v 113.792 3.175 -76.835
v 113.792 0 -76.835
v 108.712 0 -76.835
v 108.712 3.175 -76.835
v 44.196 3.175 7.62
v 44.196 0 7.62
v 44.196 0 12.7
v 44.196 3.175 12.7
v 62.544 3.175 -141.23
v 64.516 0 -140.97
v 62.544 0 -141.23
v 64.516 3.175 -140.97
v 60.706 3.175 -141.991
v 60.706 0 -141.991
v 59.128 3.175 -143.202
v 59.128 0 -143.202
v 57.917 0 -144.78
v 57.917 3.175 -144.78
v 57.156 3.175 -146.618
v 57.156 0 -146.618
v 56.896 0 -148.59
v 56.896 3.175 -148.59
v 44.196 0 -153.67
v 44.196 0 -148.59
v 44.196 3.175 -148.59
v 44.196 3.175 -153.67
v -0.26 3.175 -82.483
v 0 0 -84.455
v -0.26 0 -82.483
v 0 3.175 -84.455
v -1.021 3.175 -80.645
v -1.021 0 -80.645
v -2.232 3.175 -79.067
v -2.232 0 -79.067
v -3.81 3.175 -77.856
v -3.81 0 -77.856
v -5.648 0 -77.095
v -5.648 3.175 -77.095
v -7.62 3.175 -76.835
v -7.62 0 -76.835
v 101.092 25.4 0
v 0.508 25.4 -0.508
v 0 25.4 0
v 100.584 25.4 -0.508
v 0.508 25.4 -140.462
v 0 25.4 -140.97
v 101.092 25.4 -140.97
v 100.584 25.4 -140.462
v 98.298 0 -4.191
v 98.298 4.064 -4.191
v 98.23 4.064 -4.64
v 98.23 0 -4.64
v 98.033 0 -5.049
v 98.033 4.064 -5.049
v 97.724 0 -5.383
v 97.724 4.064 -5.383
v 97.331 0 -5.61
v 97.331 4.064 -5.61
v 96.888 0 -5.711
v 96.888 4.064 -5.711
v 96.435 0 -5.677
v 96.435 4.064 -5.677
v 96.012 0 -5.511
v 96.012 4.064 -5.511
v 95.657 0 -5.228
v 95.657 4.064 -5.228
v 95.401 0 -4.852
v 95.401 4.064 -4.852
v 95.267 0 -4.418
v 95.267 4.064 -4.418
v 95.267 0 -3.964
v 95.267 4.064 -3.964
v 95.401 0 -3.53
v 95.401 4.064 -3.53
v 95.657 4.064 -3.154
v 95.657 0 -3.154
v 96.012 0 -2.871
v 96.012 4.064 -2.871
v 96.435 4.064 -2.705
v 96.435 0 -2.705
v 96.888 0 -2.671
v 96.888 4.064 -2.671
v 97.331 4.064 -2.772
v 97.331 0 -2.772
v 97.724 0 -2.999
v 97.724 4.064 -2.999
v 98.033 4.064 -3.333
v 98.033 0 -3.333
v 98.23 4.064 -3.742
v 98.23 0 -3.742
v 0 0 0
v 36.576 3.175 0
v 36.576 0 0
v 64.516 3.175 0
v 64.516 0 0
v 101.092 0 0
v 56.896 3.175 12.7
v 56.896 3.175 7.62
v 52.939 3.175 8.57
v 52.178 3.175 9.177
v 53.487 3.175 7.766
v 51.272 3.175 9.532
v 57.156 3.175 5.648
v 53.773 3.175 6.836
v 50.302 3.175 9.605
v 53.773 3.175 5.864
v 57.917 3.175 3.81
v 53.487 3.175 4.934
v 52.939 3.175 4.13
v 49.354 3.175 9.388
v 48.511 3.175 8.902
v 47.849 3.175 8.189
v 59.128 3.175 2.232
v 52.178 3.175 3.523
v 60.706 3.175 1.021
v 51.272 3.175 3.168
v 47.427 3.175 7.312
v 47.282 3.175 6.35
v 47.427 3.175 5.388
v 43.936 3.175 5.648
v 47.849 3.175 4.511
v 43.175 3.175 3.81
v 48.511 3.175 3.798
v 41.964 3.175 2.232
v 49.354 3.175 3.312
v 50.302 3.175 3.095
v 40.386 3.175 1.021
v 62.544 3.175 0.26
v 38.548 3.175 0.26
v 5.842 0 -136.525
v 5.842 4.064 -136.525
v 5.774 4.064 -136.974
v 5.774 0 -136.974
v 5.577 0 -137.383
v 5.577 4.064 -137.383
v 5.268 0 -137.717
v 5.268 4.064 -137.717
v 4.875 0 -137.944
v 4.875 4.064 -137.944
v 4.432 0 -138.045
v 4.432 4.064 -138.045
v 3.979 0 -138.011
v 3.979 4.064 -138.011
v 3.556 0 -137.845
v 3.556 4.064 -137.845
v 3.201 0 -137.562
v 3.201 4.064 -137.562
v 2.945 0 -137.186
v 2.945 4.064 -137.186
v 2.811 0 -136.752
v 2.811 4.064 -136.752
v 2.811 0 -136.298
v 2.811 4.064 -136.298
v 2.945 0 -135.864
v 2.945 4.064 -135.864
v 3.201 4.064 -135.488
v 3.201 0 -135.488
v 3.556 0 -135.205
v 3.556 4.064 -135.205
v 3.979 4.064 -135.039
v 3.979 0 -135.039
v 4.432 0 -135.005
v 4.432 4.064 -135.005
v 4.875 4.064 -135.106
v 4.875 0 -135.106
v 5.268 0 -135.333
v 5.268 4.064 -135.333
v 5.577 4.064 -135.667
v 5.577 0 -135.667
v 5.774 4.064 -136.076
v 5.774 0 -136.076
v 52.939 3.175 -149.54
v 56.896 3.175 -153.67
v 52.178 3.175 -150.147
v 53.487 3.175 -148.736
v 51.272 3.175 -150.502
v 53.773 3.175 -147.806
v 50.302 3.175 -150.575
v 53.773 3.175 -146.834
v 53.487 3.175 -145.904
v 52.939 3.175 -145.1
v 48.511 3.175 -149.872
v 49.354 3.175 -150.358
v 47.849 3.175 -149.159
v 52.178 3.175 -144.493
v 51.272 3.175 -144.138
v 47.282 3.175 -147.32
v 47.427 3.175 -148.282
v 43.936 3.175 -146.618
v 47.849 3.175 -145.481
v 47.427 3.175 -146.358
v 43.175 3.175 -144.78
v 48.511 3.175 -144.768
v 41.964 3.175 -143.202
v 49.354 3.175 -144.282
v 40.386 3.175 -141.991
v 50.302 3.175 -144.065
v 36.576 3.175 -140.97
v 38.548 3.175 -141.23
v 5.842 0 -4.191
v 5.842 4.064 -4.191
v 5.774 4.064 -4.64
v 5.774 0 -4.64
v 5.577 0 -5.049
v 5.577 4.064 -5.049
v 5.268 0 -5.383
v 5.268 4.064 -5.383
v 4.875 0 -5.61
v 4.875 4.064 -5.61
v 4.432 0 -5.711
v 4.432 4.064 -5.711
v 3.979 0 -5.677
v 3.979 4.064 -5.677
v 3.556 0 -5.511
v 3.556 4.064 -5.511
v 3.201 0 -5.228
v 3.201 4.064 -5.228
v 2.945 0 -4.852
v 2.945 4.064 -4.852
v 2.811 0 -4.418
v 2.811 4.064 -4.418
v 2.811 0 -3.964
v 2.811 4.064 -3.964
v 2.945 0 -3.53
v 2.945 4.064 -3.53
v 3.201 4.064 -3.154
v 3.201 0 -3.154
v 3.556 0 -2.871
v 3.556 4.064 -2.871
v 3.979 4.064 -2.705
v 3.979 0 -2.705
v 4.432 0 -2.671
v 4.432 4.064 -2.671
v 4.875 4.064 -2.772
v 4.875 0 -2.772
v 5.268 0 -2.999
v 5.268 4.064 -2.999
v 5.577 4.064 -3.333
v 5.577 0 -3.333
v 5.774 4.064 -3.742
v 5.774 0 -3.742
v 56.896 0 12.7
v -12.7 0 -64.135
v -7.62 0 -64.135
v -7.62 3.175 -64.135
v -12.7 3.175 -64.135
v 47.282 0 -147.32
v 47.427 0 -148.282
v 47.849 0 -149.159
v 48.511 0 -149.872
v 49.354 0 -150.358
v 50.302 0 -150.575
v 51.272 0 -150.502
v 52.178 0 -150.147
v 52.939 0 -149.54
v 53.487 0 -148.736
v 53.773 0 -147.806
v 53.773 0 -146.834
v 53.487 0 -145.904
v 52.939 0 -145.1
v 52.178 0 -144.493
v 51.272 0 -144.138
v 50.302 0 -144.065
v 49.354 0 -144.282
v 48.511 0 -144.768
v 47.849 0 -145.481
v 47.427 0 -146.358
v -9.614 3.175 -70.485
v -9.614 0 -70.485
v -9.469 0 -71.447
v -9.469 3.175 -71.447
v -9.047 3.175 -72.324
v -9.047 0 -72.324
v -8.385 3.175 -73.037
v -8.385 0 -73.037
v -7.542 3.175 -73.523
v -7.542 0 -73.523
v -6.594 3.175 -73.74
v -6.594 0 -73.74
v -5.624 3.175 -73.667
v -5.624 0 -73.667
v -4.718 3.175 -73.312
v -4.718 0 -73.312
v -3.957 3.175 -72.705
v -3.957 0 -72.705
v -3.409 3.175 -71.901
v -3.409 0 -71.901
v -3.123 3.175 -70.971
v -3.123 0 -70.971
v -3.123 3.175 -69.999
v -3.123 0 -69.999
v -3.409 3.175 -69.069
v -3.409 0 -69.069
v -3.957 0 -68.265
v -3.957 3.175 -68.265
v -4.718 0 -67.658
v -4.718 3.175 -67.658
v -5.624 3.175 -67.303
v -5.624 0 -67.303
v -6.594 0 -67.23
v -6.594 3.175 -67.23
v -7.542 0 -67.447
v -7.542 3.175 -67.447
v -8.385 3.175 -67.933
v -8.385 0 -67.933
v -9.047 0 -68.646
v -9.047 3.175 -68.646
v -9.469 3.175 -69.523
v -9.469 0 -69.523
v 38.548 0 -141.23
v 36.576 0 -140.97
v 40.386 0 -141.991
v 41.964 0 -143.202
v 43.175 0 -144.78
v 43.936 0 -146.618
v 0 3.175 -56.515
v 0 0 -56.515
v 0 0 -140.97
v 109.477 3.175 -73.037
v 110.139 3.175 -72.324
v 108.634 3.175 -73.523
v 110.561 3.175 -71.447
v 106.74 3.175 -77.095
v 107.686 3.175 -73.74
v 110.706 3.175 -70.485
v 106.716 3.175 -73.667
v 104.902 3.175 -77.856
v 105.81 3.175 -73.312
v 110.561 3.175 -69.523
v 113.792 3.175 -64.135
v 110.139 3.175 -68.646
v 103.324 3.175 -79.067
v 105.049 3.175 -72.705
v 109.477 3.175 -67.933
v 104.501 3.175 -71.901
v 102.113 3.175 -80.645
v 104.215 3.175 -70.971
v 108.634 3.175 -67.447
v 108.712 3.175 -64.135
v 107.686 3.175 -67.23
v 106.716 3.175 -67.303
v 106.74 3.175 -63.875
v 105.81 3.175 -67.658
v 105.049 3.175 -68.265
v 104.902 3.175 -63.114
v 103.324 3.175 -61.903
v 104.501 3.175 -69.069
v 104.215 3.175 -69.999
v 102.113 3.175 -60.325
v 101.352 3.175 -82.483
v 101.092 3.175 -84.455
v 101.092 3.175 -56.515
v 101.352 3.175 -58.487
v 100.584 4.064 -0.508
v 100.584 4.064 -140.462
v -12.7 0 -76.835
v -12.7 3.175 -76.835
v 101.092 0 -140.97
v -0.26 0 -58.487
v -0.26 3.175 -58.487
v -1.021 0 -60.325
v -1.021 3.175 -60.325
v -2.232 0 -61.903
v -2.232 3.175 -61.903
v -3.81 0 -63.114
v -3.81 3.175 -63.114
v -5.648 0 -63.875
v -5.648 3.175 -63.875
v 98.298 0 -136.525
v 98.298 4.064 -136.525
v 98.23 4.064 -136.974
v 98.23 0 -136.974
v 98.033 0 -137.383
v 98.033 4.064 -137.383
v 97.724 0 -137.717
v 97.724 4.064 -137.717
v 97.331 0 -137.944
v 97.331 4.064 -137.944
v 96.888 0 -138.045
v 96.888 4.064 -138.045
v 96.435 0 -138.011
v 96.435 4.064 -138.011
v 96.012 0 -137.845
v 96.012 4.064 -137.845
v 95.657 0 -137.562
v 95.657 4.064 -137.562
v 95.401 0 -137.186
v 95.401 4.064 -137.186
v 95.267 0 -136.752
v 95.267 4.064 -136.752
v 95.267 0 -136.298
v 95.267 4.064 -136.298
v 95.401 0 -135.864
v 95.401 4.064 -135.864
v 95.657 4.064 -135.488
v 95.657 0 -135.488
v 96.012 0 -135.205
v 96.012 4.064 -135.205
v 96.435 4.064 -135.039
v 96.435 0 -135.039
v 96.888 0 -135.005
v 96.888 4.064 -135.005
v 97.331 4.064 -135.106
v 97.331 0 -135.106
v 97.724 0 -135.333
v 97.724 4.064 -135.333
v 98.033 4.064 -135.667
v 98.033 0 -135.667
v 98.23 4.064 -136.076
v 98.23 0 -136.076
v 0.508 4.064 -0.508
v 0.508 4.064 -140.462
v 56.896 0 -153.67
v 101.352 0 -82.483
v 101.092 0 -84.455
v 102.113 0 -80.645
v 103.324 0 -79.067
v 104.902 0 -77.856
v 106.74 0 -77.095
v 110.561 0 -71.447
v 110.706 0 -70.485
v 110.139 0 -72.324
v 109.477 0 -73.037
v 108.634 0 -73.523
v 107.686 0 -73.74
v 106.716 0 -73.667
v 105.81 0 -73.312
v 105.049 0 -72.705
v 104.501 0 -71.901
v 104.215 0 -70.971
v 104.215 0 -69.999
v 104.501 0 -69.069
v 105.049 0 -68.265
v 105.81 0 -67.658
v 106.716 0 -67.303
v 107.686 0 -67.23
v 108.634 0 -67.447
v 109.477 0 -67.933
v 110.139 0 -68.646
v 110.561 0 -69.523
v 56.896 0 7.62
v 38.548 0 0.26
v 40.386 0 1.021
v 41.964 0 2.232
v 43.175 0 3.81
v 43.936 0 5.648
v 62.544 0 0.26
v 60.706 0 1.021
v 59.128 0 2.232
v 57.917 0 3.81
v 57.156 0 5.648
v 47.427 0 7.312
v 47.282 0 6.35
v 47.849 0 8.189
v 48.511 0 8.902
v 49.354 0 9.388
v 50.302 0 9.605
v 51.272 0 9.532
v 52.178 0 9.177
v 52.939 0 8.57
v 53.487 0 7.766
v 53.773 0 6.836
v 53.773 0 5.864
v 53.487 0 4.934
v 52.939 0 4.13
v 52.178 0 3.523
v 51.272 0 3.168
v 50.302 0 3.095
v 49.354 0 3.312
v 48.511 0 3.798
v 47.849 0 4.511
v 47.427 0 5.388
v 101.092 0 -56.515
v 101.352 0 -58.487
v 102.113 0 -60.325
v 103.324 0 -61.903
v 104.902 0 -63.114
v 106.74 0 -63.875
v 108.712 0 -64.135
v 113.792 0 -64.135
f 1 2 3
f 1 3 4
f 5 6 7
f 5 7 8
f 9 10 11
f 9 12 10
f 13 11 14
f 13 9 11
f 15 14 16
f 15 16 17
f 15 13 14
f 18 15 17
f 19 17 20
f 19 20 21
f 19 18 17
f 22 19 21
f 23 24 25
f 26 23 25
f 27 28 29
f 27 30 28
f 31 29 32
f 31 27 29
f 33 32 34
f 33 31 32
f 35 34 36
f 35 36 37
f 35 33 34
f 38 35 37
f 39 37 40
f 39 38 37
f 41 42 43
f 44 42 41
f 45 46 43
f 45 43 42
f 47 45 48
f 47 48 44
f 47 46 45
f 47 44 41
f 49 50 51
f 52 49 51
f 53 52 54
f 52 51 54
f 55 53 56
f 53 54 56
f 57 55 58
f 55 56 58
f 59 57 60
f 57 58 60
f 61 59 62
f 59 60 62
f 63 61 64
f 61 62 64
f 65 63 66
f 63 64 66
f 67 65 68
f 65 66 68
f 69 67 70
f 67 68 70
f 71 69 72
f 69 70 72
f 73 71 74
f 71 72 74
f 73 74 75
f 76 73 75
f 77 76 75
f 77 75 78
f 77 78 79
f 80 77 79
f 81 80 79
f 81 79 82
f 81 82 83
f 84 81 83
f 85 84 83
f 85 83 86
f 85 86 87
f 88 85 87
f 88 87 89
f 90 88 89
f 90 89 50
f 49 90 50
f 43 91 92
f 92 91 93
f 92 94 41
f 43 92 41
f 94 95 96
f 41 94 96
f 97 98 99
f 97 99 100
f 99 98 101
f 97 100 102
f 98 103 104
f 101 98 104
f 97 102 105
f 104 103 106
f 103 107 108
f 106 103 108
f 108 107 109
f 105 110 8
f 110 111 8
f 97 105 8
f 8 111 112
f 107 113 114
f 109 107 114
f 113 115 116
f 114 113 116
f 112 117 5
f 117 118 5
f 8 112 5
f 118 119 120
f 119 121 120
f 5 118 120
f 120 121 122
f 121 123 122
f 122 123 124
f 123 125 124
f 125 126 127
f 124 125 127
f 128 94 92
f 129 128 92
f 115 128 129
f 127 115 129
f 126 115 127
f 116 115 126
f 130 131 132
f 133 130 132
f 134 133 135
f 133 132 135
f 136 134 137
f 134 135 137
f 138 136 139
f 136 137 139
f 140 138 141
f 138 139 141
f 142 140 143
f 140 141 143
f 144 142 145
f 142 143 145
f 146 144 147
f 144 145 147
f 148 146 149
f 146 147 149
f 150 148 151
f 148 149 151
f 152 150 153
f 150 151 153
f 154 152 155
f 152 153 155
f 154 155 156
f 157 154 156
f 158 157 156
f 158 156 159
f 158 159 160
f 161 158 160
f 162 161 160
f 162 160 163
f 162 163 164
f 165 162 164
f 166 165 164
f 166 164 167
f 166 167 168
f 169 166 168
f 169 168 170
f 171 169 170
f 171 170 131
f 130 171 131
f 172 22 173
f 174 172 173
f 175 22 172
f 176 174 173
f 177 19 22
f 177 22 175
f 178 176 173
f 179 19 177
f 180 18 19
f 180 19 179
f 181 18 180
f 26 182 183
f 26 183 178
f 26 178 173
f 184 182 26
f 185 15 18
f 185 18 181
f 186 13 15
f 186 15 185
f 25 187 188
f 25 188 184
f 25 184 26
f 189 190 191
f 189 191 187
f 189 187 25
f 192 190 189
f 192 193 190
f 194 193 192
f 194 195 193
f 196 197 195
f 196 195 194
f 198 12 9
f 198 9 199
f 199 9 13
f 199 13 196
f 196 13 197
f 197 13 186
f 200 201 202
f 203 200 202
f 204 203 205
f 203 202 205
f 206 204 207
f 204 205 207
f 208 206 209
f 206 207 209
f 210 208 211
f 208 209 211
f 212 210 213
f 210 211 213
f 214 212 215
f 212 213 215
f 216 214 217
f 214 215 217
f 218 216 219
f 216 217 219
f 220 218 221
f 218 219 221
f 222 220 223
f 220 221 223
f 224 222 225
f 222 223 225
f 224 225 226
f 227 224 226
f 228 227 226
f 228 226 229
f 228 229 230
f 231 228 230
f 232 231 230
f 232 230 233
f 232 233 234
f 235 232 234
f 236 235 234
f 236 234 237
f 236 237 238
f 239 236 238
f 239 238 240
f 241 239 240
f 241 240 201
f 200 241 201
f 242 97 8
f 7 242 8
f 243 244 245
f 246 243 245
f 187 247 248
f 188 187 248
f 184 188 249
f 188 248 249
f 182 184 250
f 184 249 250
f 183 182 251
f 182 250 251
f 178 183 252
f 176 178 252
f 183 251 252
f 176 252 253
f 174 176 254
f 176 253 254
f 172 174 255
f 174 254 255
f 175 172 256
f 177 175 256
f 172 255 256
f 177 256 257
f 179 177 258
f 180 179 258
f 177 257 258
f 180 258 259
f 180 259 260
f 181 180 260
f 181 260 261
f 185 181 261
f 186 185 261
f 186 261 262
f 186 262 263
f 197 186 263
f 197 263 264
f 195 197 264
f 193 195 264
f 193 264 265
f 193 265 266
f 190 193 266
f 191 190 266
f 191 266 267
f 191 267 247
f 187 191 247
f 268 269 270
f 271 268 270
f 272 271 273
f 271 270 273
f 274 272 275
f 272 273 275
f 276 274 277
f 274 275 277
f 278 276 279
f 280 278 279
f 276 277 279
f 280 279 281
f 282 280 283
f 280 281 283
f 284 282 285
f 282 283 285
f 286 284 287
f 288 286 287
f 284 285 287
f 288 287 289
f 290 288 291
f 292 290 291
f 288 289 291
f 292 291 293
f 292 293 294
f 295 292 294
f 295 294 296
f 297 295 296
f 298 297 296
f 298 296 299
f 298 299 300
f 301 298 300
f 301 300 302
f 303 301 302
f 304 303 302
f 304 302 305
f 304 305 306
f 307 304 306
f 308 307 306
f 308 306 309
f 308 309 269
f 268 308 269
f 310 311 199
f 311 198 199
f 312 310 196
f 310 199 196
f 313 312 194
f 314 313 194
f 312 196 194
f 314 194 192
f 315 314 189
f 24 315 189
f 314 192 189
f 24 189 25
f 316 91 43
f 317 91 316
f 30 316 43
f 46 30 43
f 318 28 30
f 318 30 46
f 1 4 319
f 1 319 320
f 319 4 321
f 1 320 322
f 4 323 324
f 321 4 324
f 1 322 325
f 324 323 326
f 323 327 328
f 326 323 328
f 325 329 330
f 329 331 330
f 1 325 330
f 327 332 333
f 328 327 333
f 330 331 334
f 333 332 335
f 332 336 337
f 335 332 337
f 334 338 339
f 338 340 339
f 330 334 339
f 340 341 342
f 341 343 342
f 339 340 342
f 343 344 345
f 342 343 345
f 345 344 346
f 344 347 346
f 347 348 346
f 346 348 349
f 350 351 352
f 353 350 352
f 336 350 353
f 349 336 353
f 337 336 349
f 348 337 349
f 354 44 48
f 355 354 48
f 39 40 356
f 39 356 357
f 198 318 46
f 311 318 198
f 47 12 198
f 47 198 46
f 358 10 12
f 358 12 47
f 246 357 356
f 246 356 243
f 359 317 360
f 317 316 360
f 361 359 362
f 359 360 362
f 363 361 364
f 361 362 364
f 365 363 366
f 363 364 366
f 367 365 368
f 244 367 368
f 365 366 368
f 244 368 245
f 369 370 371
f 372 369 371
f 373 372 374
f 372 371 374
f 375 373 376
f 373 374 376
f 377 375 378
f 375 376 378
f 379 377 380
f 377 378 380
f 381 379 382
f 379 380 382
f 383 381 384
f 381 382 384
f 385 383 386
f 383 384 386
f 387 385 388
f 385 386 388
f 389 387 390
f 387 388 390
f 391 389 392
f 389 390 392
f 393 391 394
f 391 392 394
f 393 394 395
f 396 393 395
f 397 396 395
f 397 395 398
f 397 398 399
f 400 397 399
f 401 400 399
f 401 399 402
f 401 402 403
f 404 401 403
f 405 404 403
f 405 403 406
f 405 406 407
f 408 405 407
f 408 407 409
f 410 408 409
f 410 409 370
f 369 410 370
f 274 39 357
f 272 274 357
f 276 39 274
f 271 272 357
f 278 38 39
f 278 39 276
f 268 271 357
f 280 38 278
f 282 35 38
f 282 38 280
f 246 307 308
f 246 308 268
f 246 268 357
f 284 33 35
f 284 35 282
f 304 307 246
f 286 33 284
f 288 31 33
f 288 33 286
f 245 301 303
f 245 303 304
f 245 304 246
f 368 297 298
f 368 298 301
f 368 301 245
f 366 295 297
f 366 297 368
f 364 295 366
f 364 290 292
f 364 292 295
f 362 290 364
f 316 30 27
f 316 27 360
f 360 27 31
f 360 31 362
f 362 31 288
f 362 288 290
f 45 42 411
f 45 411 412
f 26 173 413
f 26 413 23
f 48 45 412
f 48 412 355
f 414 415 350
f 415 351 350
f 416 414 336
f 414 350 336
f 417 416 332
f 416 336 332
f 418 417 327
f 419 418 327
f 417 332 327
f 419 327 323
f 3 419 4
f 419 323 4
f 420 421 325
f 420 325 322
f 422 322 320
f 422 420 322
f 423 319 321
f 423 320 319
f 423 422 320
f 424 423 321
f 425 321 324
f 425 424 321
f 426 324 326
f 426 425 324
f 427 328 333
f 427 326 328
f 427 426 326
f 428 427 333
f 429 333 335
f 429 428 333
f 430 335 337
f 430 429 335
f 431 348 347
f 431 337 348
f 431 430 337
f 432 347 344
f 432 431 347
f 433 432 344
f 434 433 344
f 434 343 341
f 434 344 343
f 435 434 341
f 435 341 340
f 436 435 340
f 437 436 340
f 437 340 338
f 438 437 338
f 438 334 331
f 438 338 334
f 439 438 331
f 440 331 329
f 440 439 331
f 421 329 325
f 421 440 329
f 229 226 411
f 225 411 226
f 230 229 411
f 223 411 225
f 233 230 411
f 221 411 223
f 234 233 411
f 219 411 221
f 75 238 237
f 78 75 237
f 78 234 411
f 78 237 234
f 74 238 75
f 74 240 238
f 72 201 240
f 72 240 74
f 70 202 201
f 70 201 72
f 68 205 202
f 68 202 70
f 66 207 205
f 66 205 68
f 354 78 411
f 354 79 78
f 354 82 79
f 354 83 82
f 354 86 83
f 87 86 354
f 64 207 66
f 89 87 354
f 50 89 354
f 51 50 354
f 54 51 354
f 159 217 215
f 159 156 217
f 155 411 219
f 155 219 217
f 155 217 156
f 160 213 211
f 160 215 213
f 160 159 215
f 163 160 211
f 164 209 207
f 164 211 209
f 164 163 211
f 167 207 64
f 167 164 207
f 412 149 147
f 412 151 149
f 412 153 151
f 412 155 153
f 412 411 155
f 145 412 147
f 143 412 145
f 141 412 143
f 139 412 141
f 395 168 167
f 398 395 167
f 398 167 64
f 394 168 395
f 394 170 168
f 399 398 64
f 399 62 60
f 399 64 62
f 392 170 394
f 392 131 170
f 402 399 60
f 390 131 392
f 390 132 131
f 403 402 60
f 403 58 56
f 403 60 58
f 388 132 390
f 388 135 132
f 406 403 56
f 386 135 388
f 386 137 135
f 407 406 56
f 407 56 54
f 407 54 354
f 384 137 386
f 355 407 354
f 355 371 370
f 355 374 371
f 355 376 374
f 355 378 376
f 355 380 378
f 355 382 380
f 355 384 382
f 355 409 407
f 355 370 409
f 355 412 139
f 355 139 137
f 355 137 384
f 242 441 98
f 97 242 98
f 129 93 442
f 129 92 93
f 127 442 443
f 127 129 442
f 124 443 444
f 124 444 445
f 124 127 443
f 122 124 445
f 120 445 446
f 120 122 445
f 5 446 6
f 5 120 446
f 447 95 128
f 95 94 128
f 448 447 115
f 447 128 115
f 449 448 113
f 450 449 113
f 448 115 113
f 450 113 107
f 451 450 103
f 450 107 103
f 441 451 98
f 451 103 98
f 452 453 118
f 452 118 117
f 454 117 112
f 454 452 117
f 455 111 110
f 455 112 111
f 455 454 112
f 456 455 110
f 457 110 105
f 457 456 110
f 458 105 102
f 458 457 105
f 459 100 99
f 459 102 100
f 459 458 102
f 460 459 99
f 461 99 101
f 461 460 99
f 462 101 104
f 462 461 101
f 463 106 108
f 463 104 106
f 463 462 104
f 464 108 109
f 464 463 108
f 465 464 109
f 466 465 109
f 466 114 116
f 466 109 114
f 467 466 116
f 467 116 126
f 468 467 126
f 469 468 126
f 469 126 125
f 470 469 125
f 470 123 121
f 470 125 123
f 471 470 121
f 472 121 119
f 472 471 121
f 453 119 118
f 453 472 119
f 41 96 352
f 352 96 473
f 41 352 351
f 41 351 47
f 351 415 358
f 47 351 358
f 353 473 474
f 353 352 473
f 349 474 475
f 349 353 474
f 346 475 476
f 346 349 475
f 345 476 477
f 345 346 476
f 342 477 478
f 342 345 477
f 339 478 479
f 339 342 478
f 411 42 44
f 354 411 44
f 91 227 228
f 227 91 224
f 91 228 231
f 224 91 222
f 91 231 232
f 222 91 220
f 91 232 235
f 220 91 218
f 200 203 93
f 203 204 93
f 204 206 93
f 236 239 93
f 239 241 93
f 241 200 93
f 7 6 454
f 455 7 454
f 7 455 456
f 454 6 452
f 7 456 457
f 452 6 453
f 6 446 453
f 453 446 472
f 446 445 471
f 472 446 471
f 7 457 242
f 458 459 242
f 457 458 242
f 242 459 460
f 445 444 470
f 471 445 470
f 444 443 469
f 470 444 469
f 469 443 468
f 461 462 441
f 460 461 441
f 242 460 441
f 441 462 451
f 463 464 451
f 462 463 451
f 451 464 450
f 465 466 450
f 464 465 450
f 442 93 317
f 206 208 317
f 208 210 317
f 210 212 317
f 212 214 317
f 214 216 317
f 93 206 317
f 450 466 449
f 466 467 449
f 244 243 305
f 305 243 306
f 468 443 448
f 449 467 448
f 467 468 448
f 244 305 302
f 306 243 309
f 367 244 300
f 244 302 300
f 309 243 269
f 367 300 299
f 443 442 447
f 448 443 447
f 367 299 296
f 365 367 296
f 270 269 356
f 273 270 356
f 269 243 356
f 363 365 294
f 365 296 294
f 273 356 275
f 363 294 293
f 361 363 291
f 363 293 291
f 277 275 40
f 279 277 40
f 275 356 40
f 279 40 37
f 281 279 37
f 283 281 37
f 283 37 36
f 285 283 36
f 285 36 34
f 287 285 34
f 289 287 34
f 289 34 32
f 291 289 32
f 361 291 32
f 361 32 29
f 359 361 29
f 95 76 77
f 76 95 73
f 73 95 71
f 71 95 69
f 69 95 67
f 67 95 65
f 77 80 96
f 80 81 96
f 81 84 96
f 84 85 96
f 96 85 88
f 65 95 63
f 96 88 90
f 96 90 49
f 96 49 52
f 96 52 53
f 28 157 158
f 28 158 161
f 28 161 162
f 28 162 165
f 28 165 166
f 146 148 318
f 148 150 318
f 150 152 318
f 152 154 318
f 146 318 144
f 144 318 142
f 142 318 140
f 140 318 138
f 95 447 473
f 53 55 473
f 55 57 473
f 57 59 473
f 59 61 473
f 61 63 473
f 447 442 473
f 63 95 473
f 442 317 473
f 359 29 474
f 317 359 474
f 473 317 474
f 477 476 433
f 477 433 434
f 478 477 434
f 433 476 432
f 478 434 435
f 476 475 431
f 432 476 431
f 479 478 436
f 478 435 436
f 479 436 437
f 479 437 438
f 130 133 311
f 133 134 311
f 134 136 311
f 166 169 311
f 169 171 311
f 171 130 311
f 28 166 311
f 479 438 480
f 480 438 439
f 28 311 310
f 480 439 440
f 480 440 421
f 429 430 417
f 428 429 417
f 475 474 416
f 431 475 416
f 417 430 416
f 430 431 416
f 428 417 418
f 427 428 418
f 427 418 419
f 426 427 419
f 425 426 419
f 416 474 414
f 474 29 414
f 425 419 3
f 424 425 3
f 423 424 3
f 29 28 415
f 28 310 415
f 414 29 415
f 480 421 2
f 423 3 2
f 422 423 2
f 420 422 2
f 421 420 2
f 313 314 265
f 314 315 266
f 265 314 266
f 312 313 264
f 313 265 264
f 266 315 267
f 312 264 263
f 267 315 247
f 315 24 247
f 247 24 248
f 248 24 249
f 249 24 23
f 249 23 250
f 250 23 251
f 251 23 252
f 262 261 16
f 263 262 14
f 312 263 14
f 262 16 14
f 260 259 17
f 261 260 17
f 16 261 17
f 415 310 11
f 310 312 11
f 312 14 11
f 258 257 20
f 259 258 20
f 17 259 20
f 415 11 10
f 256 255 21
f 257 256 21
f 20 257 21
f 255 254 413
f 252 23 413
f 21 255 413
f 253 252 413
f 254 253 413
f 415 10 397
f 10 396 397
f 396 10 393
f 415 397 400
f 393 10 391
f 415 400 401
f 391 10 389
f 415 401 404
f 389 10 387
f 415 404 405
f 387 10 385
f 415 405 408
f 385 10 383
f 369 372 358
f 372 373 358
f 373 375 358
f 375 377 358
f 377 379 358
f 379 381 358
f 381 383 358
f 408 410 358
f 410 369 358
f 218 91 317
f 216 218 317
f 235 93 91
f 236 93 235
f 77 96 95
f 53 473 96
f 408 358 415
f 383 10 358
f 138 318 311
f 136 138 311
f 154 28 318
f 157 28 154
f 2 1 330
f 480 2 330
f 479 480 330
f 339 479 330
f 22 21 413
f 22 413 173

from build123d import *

# Parameters (mm, degrees)
SKETCH1_W                = 101.092
SKETCH1_H                = 140.97
BOSS_EXTRUDE1_DEPTH      = 25.4
SKETCH2_W                = 100.076
SKETCH2_H                = 139.954
CUT_EXTRUDE1_DEPTH       = 21.336
SKETCH3_R                = 1.524
CUT_EXTRUDE2_DEPTH       = 21.336
SKETCH4_W                = 12.7
SKETCH4_H                = 3.175
BOSS_EXTRUDE2_DEPTH      = 12.7
F_5_16_18_TAPPED_HOLE1_D = 6.5278
SKETCH13_W               = 12.7
SKETCH13_H               = 3.175
BOSS_EXTRUDE3_DEPTH      = 12.7
F_5_16_18_TAPPED_HOLE2_D = 6.5278
FILLET1_R                = 7.62


with BuildPart() as part:
    # Sketch1 → Boss-Extrude1 (new body)
    with BuildSketch(Plane(origin=(0, 0, 0), x_dir=(1, 0, 0), z_dir=(0, 1, 0))):
        with Locations((50.546, 70.485)):
            Rectangle(SKETCH1_W, SKETCH1_H)
    extrude(amount=BOSS_EXTRUDE1_DEPTH)

    # Sketch2 → Cut-Extrude1 (cut)
    with BuildSketch(Plane(origin=(0, 25.4, 0), x_dir=(1, 0, 0), z_dir=(0, 1, 0))):
        with Locations((50.546, 70.485)):
            Rectangle(SKETCH2_W, SKETCH2_H)
    extrude(amount=-CUT_EXTRUDE1_DEPTH, mode=Mode.SUBTRACT)

    # Sketch3 → Cut-Extrude2 (cut)
    with BuildSketch(Plane(origin=(0, 4.064, 0), x_dir=(1, 0, 0), z_dir=(0, 1, 0))):
        with Locations((4.318, 136.525)):
            Circle(SKETCH3_R)
        with Locations((96.774, 136.525)):
            Circle(SKETCH3_R)
        with Locations((96.774, 4.191)):
            Circle(SKETCH3_R)
        with Locations((4.318, 4.191)):
            Circle(SKETCH3_R)
    extrude(amount=-CUT_EXTRUDE2_DEPTH, mode=Mode.SUBTRACT)

    # Sketch4 → Boss-Extrude2 (add)
    with BuildSketch(Plane(origin=(0, 0, -140.97), x_dir=(-1, 0, 0), z_dir=(0, 0, -1))):
        with Locations((-50.546, 1.5875)):
            Rectangle(SKETCH4_W, SKETCH4_H)
    boss_extrude2 = extrude(amount=BOSS_EXTRUDE2_DEPTH)

    # 5/16-18 Tapped Hole1 (through all)
    with Locations(Plane(origin=(0, 3.175, 0), x_dir=(1, 0, 0), z_dir=(0, 1, 0))):
        with Locations((50.546, 147.32)):
            f_5_16_18_tapped_hole1 = Hole(F_5_16_18_TAPPED_HOLE1_D / 2)

    # Mirror1: Boss-Extrude2, 5/16-18 Tapped Hole1 across plane
    add(boss_extrude2.mirror(Plane.XY.offset(-70.485)))
    add(f_5_16_18_tapped_hole1.mirror(Plane.XY.offset(-70.485)), mode=Mode.SUBTRACT)

    # Sketch13 → Boss-Extrude3 (add)
    with BuildSketch(Plane.ZY):
        with Locations((-70.485, 1.5875)):
            Rectangle(SKETCH13_W, SKETCH13_H)
    boss_extrude3 = extrude(amount=BOSS_EXTRUDE3_DEPTH)

    # 5/16-18 Tapped Hole2 (through all)
    with Locations(Plane(origin=(0, 3.175, 0), x_dir=(1, 0, 0), z_dir=(0, 1, 0))):
        with Locations((-6.35, 70.485)):
            f_5_16_18_tapped_hole2 = Hole(F_5_16_18_TAPPED_HOLE2_D / 2)

    # Mirror2: Boss-Extrude3, 5/16-18 Tapped Hole2 across plane
    add(boss_extrude3.mirror(Plane.ZY.offset(-50.546)))
    add(f_5_16_18_tapped_hole2.mirror(Plane.ZY.offset(-50.546)), mode=Mode.SUBTRACT)

    # Fillet1
    fillet1_edges = [part.edges().sort_by_distance(p)[0] for p in [
        (101.092, 1.5875, -64.135),
        (101.092, 1.5875, -76.835),
        (56.896, 1.5875, -140.97),
        (44.196, 1.5875, -140.97),
        (56.896, 1.5875, 0),
        (44.196, 1.5875, 0),
        (0, 1.5875, -64.135),
        (0, 1.5875, -76.835),
    ]]
    fillet(fillet1_edges, radius=FILLET1_R)


solid = part.part
